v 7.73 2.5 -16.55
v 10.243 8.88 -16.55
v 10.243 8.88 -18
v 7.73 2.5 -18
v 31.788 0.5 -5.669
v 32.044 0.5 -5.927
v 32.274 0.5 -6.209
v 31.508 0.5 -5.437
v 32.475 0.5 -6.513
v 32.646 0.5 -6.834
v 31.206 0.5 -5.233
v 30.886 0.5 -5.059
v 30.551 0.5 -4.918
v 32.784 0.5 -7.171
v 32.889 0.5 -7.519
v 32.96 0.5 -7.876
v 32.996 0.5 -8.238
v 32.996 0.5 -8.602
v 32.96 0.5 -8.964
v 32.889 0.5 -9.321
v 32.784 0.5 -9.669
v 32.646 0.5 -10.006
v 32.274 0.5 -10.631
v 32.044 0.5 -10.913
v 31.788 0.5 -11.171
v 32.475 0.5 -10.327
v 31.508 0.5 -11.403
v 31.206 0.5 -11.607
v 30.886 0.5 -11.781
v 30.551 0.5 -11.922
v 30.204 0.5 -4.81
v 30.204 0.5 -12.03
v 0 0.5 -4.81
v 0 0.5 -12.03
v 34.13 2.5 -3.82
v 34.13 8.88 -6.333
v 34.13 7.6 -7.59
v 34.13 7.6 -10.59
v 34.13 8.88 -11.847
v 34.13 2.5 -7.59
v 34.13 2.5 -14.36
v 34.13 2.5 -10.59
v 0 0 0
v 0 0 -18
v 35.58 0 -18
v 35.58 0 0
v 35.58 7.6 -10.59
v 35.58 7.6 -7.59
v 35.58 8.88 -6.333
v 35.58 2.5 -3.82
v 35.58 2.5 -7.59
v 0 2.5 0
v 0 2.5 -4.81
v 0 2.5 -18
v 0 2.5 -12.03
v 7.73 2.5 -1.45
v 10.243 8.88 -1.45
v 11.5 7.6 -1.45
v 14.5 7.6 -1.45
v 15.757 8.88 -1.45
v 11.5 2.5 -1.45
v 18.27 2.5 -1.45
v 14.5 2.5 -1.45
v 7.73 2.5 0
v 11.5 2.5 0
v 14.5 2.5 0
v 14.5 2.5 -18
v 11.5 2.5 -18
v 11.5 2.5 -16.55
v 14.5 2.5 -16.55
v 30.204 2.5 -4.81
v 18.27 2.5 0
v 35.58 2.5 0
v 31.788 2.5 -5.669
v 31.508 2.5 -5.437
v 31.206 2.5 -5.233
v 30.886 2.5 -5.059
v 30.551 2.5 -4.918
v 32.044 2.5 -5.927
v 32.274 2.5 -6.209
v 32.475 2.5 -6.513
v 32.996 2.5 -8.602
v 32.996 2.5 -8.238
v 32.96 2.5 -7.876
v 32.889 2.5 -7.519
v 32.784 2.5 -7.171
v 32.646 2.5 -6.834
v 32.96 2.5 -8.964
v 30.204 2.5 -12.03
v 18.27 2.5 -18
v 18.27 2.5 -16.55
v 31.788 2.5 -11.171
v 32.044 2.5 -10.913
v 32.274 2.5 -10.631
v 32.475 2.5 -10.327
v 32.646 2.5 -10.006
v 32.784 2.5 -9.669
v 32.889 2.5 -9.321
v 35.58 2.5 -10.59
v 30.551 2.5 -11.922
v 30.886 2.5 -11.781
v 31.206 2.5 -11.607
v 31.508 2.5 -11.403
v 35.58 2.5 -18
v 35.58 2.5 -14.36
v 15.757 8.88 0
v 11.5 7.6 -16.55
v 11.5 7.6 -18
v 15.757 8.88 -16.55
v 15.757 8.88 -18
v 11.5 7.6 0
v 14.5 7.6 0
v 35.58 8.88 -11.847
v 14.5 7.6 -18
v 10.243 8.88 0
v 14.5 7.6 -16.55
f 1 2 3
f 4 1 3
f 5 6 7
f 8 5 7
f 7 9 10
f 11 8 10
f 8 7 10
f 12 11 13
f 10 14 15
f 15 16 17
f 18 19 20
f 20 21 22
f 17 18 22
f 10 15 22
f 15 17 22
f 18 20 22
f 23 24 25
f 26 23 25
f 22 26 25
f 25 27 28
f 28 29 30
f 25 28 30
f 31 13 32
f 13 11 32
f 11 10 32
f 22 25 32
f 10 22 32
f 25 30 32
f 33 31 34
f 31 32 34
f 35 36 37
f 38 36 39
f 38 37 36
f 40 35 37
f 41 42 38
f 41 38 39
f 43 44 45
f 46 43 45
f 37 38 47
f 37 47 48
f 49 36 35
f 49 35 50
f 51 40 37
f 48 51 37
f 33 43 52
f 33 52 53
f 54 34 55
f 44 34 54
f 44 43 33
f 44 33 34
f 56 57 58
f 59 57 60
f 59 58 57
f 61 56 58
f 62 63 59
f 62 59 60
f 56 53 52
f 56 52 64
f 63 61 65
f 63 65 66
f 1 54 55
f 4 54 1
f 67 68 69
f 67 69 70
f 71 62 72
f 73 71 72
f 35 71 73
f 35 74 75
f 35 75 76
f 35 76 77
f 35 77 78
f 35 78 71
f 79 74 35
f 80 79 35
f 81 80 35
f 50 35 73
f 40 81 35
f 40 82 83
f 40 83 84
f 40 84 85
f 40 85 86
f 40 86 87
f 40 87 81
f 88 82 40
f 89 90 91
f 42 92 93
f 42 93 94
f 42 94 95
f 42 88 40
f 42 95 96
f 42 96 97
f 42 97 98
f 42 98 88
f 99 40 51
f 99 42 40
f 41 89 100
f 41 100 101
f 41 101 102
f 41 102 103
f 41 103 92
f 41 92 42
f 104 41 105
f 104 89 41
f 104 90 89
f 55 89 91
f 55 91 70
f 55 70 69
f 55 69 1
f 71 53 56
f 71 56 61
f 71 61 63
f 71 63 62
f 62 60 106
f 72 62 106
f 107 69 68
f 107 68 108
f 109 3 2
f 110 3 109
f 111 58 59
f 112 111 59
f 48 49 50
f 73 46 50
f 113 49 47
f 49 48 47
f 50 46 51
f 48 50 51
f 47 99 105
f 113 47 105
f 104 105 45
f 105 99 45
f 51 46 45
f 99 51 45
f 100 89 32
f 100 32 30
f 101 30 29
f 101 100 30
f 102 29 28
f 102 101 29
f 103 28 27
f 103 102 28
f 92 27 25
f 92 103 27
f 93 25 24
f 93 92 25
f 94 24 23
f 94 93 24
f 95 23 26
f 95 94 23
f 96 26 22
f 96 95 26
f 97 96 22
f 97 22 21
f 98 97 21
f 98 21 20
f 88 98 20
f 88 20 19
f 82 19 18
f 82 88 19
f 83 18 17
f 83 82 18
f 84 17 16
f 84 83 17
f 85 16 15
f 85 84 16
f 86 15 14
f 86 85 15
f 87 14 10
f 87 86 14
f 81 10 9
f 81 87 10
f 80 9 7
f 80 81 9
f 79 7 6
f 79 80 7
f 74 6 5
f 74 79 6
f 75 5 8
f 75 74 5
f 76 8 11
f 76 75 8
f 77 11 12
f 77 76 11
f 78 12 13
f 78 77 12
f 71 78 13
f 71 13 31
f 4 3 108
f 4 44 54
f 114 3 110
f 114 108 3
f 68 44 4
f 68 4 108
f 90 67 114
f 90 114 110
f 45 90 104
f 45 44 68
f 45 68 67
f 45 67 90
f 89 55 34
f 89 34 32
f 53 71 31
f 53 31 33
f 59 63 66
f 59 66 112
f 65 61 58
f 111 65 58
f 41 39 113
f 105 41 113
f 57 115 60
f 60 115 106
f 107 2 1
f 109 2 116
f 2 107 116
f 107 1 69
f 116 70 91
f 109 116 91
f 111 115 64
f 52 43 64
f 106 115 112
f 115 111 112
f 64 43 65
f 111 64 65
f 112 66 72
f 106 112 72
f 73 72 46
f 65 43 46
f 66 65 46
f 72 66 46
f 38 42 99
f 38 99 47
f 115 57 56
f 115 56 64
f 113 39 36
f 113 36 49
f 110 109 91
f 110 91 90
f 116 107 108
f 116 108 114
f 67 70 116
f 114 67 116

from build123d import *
from OCP.BRepFilletAPI import BRepFilletAPI_MakeChamfer

# Parameters (mm, degrees)
SKETCH1_W                  = 35.58
SKETCH1_H                  = 18
BOSS_EXTRUDE1_DEPTH        = 2.5
CUT_EXTRUDE1_DEPTH         = 2
SKETCH3_W                  = 10.54
SKETCH3_H                  = 1.45
BOSS_EXTRUDE2_DEPTH        = 6.38
CHAMFER1_SIZE              = 6.38
CHAMFER1_SIZE_2            = 2.513148834
SKETCH4_W                  = 3
SKETCH4_H                  = 5.1
CUT_EXTRUDE2_DEPTH         = 6.38
CHAMFER1_OF_MIRROR1_SIZE   = 6.38
CHAMFER1_OF_MIRROR1_SIZE_2 = 2.513148834
SKETCH14_W                 = 1.45
SKETCH14_H                 = 10.54
BOSS_EXTRUDE5_DEPTH        = 6.38
CHAMFER4_SIZE              = 6.38
CHAMFER4_SIZE_2            = 2.513148834
SKETCH15_W                 = 3
SKETCH15_H                 = 5.1
CUT_EXTRUDE4_DEPTH         = 6.38


with BuildPart() as part:
    # Sketch1 → Boss-Extrude1 (new body)
    with BuildSketch(Plane(origin=(0, 0, 0), x_dir=(1, 0, 0), z_dir=(0, 1, 0))):
        with Locations((17.79, 9)):
            Rectangle(SKETCH1_W, SKETCH1_H)
    extrude(amount=BOSS_EXTRUDE1_DEPTH)

    # Sketch2 → Cut-Extrude1 (cut)
    with BuildSketch(Plane(origin=(0, 2.5, 0), x_dir=(1, 0, 0), z_dir=(0, 1, 0))):
        with BuildLine():
            Line((0, 12.03), (30.203676308, 12.03))
            ThreePointArc((30.203676308, 12.03), (33, 8.42), (30.203676308, 4.81))
            Line((30.203676308, 4.81), (0, 4.81))
            Line((0, 4.81), (0, 12.03))
        make_face()
    extrude(amount=-CUT_EXTRUDE1_DEPTH, mode=Mode.SUBTRACT)

    # Sketch3 → Boss-Extrude2 (add)
    with BuildSketch(Plane(origin=(0, 2.5, 0), x_dir=(1, 0, 0), z_dir=(0, 1, 0))):
        with Locations((13, 17.275)):
            Rectangle(SKETCH3_W, SKETCH3_H)
    boss_extrude2 = extrude(amount=BOSS_EXTRUDE2_DEPTH)

    # Chamfer1
    chamfer1_edges_1 = [part.edges().sort_by_distance(p)[0] for p in [
        (18.27, 8.88, -17.275),
    ]]
    chamfer1_side_1 = [part.faces().sort_by_distance(p)[0] for p in [
        (18.27, 8.829737023, -17.275),
    ]]
    chamfer1_edges_2 = [part.edges().sort_by_distance(p)[0] for p in [
        (7.73, 8.88, -17.275),
    ]]
    chamfer1_side_2 = [part.faces().sort_by_distance(p)[0] for p in [
        (7.73, 8.829737023, -17.275),
    ]]
    chamfer1 = BRepFilletAPI_MakeChamfer(part.part.solid().wrapped)
    for e in chamfer1_edges_1:
        chamfer1.Add(CHAMFER1_SIZE - 0.0001, CHAMFER1_SIZE_2 - 0.0001, e.wrapped, chamfer1_side_1[0].wrapped)
    for e in chamfer1_edges_2:
        chamfer1.Add(CHAMFER1_SIZE - 0.0001, CHAMFER1_SIZE_2 - 0.0001, e.wrapped, chamfer1_side_2[0].wrapped)
    add(Compound.cast(chamfer1.Shape()), mode=Mode.REPLACE)  # a hair under: the kernel refuses the full size

    # Sketch4 → Cut-Extrude2 (cut)
    with BuildSketch(Plane.XY.offset(-16.55)):
        with Locations((13, 5.05)):
            Rectangle(SKETCH4_W, SKETCH4_H)
    cut_extrude2 = extrude(amount=-CUT_EXTRUDE2_DEPTH, mode=Mode.SUBTRACT)

    # Mirror1: Boss-Extrude2, Cut-Extrude2 across plane
    add(boss_extrude2.mirror(Plane.XY.offset(-9)))
    add(cut_extrude2.mirror(Plane.XY.offset(-9)), mode=Mode.SUBTRACT)

    # Chamfer1 of Mirror1
    chamfer1_of_mirror1_edges_1 = [part.edges().sort_by_distance(p)[0] for p in [
        (18.27, 8.88, -0.725),
    ]]
    chamfer1_of_mirror1_side_1 = [part.faces().sort_by_distance(p)[0] for p in [
        (18.27, 8.829737023, -0.725),
    ]]
    chamfer1_of_mirror1_edges_2 = [part.edges().sort_by_distance(p)[0] for p in [
        (7.73, 8.88, -0.725),
    ]]
    chamfer1_of_mirror1_side_2 = [part.faces().sort_by_distance(p)[0] for p in [
        (7.73, 8.829737023, -0.725),
    ]]
    chamfer1_of_mirror1 = BRepFilletAPI_MakeChamfer(part.part.solid().wrapped)
    for e in chamfer1_of_mirror1_edges_1:
        chamfer1_of_mirror1.Add(CHAMFER1_OF_MIRROR1_SIZE - 0.0001, CHAMFER1_OF_MIRROR1_SIZE_2 - 0.0001, e.wrapped, chamfer1_of_mirror1_side_1[0].wrapped)
    for e in chamfer1_of_mirror1_edges_2:
        chamfer1_of_mirror1.Add(CHAMFER1_OF_MIRROR1_SIZE - 0.0001, CHAMFER1_OF_MIRROR1_SIZE_2 - 0.0001, e.wrapped, chamfer1_of_mirror1_side_2[0].wrapped)
    add(Compound.cast(chamfer1_of_mirror1.Shape()), mode=Mode.REPLACE)  # a hair under: the kernel refuses the full size

    # Sketch14 → Boss-Extrude5 (add)
    with BuildSketch(Plane(origin=(0, 2.5, 0), x_dir=(1, 0, 0), z_dir=(0, 1, 0))):
        with Locations((34.855, 9.09)):
            Rectangle(SKETCH14_W, SKETCH14_H)
    extrude(amount=BOSS_EXTRUDE5_DEPTH)

    # Chamfer4
    chamfer4_edges_1 = [part.edges().sort_by_distance(p)[0] for p in [
        (34.855, 8.88, -14.36),
    ]]
    chamfer4_side_1 = [part.faces().sort_by_distance(p)[0] for p in [
        (34.855, 8.829737023, -14.36),
    ]]
    chamfer4_edges_2 = [part.edges().sort_by_distance(p)[0] for p in [
        (34.855, 8.88, -3.82),
    ]]
    chamfer4_side_2 = [part.faces().sort_by_distance(p)[0] for p in [
        (34.855, 8.829737023, -3.82),
    ]]
    chamfer4 = BRepFilletAPI_MakeChamfer(part.part.solid().wrapped)
    for e in chamfer4_edges_1:
        chamfer4.Add(CHAMFER4_SIZE - 0.0001, CHAMFER4_SIZE_2 - 0.0001, e.wrapped, chamfer4_side_1[0].wrapped)
    for e in chamfer4_edges_2:
        chamfer4.Add(CHAMFER4_SIZE - 0.0001, CHAMFER4_SIZE_2 - 0.0001, e.wrapped, chamfer4_side_2[0].wrapped)
    add(Compound.cast(chamfer4.Shape()), mode=Mode.REPLACE)  # a hair under: the kernel refuses the full size

    # Sketch15 → Cut-Extrude4 (cut)
    with BuildSketch(Plane.ZY.offset(-34.13)):
        with Locations((-9.09, 5.05)):
            Rectangle(SKETCH15_W, SKETCH15_H)
    extrude(amount=-CUT_EXTRUDE4_DEPTH, mode=Mode.SUBTRACT)


solid = part.part
